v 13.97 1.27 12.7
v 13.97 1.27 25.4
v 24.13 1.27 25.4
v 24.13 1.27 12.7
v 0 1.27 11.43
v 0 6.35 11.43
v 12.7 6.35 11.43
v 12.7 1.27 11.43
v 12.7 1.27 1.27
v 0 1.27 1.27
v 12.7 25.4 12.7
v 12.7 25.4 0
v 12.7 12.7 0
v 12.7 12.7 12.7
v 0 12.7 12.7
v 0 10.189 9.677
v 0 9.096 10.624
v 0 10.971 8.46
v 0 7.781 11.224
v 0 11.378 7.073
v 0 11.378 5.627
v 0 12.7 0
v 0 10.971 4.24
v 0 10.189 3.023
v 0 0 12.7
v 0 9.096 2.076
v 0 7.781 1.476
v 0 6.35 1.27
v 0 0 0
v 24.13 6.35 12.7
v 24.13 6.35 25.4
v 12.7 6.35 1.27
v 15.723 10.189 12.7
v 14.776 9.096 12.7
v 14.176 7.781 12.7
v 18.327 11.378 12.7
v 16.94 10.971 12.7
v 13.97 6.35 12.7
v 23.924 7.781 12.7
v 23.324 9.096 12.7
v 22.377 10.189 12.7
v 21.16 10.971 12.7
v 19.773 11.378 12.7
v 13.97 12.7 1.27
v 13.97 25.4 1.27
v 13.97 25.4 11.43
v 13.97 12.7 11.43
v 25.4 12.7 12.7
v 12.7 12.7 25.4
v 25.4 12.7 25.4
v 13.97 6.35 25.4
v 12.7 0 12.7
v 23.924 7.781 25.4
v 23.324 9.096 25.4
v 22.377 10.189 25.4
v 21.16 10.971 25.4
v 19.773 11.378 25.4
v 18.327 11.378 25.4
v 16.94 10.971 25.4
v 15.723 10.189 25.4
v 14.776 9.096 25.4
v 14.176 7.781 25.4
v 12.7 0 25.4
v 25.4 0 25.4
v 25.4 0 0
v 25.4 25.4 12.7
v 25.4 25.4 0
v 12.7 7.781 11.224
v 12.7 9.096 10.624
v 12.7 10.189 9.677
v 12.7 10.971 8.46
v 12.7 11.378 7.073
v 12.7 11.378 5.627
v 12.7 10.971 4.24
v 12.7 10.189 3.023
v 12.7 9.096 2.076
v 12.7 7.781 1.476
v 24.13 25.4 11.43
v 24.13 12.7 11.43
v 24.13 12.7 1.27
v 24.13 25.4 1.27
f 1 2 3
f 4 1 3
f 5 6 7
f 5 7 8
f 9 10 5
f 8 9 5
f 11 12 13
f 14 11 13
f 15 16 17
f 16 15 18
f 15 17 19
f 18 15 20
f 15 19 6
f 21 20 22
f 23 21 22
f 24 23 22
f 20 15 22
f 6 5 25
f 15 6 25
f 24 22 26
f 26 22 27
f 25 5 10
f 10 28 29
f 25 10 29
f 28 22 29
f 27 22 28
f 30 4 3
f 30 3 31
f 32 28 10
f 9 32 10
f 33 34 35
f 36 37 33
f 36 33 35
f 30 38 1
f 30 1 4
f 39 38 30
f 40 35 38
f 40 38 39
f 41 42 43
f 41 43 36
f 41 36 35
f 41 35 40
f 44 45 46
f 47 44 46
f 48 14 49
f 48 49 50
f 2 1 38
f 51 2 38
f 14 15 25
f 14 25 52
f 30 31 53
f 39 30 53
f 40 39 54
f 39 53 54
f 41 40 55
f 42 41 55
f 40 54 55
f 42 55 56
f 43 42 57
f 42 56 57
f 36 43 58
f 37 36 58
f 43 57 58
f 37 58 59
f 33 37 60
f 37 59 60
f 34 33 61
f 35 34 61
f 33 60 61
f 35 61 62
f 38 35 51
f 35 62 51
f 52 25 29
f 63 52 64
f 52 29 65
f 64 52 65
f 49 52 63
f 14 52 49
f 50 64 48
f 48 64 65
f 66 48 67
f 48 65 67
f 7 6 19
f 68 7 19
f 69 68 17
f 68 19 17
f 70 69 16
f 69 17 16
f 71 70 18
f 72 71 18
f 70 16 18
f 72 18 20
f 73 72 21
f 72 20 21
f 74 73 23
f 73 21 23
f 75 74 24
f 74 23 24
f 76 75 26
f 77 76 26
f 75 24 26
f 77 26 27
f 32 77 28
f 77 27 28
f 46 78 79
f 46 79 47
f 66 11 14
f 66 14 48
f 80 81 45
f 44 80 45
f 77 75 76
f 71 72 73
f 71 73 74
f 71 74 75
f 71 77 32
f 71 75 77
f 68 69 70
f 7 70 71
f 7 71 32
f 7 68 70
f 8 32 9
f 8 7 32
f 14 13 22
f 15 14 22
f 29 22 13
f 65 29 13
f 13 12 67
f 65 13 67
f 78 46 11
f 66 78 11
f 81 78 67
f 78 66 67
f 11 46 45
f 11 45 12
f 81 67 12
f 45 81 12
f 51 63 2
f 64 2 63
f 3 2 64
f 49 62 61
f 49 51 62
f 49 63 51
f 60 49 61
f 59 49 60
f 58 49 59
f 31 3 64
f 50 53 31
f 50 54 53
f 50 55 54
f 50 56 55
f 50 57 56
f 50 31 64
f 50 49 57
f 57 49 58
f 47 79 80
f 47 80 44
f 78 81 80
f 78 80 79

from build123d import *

# Parameters (mm, degrees)
F1_DEPTH  = 12.7
F2_W      = 12.7
F2_H      = 12.7
F3_DEPTH  = 12.7
F5_W      = 10.16
F5_H      = 5.08
F6_DEPTH  = 12.7
F7_W      = 5.08
F7_H      = 10.16
F8_DEPTH  = 12.7
F9_W      = 10.16
F9_H      = 10.16
F10_DEPTH = 12.7


with BuildPart() as f1:
    # F0 (on Top) → F1 (new body)
    with BuildSketch(Plane.XY):
        Polygon((0, 12.7), (0, 0), (25.4, 0), (25.4, 12.7), (25.4, 25.4), (12.7, 25.4), (12.7, 12.7), align=None)
    extrude(amount=F1_DEPTH)

    # F2 (on face) → F3 (join)
    with BuildSketch(Plane.XY.offset(12.7)):
        with Locations((19.05, 6.35)):
            Rectangle(F2_W, F2_H)
    extrude(amount=F3_DEPTH)

    # F5 (on face) → F6 (cut)
    with BuildSketch(Plane.XY.offset(25.4)):
        with Locations((19.05, 3.81)):
            Rectangle(F5_W, F5_H)
        with BuildLine():
            Line((13.97, 6.35), (24.13, 6.35))
            ThreePointArc((24.13, 6.35), (19.05, 11.43), (13.97, 6.35))
        make_face()
    extrude(amount=-F6_DEPTH, mode=Mode.SUBTRACT)

    # F7 (on face) → F8 (cut)
    with BuildSketch(Plane(origin=(0, 0, 0), x_dir=(0, -1, 0), z_dir=(-1, 0, 0))):
        with Locations((-3.81, 6.35)):
            Rectangle(F7_W, F7_H)
        with BuildLine():
            Line((-6.35, 1.27), (-6.35, 11.43))
            ThreePointArc((-6.35, 11.43), (-11.43, 6.35), (-6.35, 1.27))
        make_face()
    extrude(amount=-F8_DEPTH, mode=Mode.SUBTRACT)

    # F9 (on face) → F10 (cut)
    with BuildSketch(Plane(origin=(0, 25.4, 0), x_dir=(-1, 0, 0), z_dir=(0, 1, 0))):
        with Locations((-19.05, 6.35)):
            Rectangle(F9_W, F9_H)
    extrude(amount=-F10_DEPTH, mode=Mode.SUBTRACT)


solid = f1.part
